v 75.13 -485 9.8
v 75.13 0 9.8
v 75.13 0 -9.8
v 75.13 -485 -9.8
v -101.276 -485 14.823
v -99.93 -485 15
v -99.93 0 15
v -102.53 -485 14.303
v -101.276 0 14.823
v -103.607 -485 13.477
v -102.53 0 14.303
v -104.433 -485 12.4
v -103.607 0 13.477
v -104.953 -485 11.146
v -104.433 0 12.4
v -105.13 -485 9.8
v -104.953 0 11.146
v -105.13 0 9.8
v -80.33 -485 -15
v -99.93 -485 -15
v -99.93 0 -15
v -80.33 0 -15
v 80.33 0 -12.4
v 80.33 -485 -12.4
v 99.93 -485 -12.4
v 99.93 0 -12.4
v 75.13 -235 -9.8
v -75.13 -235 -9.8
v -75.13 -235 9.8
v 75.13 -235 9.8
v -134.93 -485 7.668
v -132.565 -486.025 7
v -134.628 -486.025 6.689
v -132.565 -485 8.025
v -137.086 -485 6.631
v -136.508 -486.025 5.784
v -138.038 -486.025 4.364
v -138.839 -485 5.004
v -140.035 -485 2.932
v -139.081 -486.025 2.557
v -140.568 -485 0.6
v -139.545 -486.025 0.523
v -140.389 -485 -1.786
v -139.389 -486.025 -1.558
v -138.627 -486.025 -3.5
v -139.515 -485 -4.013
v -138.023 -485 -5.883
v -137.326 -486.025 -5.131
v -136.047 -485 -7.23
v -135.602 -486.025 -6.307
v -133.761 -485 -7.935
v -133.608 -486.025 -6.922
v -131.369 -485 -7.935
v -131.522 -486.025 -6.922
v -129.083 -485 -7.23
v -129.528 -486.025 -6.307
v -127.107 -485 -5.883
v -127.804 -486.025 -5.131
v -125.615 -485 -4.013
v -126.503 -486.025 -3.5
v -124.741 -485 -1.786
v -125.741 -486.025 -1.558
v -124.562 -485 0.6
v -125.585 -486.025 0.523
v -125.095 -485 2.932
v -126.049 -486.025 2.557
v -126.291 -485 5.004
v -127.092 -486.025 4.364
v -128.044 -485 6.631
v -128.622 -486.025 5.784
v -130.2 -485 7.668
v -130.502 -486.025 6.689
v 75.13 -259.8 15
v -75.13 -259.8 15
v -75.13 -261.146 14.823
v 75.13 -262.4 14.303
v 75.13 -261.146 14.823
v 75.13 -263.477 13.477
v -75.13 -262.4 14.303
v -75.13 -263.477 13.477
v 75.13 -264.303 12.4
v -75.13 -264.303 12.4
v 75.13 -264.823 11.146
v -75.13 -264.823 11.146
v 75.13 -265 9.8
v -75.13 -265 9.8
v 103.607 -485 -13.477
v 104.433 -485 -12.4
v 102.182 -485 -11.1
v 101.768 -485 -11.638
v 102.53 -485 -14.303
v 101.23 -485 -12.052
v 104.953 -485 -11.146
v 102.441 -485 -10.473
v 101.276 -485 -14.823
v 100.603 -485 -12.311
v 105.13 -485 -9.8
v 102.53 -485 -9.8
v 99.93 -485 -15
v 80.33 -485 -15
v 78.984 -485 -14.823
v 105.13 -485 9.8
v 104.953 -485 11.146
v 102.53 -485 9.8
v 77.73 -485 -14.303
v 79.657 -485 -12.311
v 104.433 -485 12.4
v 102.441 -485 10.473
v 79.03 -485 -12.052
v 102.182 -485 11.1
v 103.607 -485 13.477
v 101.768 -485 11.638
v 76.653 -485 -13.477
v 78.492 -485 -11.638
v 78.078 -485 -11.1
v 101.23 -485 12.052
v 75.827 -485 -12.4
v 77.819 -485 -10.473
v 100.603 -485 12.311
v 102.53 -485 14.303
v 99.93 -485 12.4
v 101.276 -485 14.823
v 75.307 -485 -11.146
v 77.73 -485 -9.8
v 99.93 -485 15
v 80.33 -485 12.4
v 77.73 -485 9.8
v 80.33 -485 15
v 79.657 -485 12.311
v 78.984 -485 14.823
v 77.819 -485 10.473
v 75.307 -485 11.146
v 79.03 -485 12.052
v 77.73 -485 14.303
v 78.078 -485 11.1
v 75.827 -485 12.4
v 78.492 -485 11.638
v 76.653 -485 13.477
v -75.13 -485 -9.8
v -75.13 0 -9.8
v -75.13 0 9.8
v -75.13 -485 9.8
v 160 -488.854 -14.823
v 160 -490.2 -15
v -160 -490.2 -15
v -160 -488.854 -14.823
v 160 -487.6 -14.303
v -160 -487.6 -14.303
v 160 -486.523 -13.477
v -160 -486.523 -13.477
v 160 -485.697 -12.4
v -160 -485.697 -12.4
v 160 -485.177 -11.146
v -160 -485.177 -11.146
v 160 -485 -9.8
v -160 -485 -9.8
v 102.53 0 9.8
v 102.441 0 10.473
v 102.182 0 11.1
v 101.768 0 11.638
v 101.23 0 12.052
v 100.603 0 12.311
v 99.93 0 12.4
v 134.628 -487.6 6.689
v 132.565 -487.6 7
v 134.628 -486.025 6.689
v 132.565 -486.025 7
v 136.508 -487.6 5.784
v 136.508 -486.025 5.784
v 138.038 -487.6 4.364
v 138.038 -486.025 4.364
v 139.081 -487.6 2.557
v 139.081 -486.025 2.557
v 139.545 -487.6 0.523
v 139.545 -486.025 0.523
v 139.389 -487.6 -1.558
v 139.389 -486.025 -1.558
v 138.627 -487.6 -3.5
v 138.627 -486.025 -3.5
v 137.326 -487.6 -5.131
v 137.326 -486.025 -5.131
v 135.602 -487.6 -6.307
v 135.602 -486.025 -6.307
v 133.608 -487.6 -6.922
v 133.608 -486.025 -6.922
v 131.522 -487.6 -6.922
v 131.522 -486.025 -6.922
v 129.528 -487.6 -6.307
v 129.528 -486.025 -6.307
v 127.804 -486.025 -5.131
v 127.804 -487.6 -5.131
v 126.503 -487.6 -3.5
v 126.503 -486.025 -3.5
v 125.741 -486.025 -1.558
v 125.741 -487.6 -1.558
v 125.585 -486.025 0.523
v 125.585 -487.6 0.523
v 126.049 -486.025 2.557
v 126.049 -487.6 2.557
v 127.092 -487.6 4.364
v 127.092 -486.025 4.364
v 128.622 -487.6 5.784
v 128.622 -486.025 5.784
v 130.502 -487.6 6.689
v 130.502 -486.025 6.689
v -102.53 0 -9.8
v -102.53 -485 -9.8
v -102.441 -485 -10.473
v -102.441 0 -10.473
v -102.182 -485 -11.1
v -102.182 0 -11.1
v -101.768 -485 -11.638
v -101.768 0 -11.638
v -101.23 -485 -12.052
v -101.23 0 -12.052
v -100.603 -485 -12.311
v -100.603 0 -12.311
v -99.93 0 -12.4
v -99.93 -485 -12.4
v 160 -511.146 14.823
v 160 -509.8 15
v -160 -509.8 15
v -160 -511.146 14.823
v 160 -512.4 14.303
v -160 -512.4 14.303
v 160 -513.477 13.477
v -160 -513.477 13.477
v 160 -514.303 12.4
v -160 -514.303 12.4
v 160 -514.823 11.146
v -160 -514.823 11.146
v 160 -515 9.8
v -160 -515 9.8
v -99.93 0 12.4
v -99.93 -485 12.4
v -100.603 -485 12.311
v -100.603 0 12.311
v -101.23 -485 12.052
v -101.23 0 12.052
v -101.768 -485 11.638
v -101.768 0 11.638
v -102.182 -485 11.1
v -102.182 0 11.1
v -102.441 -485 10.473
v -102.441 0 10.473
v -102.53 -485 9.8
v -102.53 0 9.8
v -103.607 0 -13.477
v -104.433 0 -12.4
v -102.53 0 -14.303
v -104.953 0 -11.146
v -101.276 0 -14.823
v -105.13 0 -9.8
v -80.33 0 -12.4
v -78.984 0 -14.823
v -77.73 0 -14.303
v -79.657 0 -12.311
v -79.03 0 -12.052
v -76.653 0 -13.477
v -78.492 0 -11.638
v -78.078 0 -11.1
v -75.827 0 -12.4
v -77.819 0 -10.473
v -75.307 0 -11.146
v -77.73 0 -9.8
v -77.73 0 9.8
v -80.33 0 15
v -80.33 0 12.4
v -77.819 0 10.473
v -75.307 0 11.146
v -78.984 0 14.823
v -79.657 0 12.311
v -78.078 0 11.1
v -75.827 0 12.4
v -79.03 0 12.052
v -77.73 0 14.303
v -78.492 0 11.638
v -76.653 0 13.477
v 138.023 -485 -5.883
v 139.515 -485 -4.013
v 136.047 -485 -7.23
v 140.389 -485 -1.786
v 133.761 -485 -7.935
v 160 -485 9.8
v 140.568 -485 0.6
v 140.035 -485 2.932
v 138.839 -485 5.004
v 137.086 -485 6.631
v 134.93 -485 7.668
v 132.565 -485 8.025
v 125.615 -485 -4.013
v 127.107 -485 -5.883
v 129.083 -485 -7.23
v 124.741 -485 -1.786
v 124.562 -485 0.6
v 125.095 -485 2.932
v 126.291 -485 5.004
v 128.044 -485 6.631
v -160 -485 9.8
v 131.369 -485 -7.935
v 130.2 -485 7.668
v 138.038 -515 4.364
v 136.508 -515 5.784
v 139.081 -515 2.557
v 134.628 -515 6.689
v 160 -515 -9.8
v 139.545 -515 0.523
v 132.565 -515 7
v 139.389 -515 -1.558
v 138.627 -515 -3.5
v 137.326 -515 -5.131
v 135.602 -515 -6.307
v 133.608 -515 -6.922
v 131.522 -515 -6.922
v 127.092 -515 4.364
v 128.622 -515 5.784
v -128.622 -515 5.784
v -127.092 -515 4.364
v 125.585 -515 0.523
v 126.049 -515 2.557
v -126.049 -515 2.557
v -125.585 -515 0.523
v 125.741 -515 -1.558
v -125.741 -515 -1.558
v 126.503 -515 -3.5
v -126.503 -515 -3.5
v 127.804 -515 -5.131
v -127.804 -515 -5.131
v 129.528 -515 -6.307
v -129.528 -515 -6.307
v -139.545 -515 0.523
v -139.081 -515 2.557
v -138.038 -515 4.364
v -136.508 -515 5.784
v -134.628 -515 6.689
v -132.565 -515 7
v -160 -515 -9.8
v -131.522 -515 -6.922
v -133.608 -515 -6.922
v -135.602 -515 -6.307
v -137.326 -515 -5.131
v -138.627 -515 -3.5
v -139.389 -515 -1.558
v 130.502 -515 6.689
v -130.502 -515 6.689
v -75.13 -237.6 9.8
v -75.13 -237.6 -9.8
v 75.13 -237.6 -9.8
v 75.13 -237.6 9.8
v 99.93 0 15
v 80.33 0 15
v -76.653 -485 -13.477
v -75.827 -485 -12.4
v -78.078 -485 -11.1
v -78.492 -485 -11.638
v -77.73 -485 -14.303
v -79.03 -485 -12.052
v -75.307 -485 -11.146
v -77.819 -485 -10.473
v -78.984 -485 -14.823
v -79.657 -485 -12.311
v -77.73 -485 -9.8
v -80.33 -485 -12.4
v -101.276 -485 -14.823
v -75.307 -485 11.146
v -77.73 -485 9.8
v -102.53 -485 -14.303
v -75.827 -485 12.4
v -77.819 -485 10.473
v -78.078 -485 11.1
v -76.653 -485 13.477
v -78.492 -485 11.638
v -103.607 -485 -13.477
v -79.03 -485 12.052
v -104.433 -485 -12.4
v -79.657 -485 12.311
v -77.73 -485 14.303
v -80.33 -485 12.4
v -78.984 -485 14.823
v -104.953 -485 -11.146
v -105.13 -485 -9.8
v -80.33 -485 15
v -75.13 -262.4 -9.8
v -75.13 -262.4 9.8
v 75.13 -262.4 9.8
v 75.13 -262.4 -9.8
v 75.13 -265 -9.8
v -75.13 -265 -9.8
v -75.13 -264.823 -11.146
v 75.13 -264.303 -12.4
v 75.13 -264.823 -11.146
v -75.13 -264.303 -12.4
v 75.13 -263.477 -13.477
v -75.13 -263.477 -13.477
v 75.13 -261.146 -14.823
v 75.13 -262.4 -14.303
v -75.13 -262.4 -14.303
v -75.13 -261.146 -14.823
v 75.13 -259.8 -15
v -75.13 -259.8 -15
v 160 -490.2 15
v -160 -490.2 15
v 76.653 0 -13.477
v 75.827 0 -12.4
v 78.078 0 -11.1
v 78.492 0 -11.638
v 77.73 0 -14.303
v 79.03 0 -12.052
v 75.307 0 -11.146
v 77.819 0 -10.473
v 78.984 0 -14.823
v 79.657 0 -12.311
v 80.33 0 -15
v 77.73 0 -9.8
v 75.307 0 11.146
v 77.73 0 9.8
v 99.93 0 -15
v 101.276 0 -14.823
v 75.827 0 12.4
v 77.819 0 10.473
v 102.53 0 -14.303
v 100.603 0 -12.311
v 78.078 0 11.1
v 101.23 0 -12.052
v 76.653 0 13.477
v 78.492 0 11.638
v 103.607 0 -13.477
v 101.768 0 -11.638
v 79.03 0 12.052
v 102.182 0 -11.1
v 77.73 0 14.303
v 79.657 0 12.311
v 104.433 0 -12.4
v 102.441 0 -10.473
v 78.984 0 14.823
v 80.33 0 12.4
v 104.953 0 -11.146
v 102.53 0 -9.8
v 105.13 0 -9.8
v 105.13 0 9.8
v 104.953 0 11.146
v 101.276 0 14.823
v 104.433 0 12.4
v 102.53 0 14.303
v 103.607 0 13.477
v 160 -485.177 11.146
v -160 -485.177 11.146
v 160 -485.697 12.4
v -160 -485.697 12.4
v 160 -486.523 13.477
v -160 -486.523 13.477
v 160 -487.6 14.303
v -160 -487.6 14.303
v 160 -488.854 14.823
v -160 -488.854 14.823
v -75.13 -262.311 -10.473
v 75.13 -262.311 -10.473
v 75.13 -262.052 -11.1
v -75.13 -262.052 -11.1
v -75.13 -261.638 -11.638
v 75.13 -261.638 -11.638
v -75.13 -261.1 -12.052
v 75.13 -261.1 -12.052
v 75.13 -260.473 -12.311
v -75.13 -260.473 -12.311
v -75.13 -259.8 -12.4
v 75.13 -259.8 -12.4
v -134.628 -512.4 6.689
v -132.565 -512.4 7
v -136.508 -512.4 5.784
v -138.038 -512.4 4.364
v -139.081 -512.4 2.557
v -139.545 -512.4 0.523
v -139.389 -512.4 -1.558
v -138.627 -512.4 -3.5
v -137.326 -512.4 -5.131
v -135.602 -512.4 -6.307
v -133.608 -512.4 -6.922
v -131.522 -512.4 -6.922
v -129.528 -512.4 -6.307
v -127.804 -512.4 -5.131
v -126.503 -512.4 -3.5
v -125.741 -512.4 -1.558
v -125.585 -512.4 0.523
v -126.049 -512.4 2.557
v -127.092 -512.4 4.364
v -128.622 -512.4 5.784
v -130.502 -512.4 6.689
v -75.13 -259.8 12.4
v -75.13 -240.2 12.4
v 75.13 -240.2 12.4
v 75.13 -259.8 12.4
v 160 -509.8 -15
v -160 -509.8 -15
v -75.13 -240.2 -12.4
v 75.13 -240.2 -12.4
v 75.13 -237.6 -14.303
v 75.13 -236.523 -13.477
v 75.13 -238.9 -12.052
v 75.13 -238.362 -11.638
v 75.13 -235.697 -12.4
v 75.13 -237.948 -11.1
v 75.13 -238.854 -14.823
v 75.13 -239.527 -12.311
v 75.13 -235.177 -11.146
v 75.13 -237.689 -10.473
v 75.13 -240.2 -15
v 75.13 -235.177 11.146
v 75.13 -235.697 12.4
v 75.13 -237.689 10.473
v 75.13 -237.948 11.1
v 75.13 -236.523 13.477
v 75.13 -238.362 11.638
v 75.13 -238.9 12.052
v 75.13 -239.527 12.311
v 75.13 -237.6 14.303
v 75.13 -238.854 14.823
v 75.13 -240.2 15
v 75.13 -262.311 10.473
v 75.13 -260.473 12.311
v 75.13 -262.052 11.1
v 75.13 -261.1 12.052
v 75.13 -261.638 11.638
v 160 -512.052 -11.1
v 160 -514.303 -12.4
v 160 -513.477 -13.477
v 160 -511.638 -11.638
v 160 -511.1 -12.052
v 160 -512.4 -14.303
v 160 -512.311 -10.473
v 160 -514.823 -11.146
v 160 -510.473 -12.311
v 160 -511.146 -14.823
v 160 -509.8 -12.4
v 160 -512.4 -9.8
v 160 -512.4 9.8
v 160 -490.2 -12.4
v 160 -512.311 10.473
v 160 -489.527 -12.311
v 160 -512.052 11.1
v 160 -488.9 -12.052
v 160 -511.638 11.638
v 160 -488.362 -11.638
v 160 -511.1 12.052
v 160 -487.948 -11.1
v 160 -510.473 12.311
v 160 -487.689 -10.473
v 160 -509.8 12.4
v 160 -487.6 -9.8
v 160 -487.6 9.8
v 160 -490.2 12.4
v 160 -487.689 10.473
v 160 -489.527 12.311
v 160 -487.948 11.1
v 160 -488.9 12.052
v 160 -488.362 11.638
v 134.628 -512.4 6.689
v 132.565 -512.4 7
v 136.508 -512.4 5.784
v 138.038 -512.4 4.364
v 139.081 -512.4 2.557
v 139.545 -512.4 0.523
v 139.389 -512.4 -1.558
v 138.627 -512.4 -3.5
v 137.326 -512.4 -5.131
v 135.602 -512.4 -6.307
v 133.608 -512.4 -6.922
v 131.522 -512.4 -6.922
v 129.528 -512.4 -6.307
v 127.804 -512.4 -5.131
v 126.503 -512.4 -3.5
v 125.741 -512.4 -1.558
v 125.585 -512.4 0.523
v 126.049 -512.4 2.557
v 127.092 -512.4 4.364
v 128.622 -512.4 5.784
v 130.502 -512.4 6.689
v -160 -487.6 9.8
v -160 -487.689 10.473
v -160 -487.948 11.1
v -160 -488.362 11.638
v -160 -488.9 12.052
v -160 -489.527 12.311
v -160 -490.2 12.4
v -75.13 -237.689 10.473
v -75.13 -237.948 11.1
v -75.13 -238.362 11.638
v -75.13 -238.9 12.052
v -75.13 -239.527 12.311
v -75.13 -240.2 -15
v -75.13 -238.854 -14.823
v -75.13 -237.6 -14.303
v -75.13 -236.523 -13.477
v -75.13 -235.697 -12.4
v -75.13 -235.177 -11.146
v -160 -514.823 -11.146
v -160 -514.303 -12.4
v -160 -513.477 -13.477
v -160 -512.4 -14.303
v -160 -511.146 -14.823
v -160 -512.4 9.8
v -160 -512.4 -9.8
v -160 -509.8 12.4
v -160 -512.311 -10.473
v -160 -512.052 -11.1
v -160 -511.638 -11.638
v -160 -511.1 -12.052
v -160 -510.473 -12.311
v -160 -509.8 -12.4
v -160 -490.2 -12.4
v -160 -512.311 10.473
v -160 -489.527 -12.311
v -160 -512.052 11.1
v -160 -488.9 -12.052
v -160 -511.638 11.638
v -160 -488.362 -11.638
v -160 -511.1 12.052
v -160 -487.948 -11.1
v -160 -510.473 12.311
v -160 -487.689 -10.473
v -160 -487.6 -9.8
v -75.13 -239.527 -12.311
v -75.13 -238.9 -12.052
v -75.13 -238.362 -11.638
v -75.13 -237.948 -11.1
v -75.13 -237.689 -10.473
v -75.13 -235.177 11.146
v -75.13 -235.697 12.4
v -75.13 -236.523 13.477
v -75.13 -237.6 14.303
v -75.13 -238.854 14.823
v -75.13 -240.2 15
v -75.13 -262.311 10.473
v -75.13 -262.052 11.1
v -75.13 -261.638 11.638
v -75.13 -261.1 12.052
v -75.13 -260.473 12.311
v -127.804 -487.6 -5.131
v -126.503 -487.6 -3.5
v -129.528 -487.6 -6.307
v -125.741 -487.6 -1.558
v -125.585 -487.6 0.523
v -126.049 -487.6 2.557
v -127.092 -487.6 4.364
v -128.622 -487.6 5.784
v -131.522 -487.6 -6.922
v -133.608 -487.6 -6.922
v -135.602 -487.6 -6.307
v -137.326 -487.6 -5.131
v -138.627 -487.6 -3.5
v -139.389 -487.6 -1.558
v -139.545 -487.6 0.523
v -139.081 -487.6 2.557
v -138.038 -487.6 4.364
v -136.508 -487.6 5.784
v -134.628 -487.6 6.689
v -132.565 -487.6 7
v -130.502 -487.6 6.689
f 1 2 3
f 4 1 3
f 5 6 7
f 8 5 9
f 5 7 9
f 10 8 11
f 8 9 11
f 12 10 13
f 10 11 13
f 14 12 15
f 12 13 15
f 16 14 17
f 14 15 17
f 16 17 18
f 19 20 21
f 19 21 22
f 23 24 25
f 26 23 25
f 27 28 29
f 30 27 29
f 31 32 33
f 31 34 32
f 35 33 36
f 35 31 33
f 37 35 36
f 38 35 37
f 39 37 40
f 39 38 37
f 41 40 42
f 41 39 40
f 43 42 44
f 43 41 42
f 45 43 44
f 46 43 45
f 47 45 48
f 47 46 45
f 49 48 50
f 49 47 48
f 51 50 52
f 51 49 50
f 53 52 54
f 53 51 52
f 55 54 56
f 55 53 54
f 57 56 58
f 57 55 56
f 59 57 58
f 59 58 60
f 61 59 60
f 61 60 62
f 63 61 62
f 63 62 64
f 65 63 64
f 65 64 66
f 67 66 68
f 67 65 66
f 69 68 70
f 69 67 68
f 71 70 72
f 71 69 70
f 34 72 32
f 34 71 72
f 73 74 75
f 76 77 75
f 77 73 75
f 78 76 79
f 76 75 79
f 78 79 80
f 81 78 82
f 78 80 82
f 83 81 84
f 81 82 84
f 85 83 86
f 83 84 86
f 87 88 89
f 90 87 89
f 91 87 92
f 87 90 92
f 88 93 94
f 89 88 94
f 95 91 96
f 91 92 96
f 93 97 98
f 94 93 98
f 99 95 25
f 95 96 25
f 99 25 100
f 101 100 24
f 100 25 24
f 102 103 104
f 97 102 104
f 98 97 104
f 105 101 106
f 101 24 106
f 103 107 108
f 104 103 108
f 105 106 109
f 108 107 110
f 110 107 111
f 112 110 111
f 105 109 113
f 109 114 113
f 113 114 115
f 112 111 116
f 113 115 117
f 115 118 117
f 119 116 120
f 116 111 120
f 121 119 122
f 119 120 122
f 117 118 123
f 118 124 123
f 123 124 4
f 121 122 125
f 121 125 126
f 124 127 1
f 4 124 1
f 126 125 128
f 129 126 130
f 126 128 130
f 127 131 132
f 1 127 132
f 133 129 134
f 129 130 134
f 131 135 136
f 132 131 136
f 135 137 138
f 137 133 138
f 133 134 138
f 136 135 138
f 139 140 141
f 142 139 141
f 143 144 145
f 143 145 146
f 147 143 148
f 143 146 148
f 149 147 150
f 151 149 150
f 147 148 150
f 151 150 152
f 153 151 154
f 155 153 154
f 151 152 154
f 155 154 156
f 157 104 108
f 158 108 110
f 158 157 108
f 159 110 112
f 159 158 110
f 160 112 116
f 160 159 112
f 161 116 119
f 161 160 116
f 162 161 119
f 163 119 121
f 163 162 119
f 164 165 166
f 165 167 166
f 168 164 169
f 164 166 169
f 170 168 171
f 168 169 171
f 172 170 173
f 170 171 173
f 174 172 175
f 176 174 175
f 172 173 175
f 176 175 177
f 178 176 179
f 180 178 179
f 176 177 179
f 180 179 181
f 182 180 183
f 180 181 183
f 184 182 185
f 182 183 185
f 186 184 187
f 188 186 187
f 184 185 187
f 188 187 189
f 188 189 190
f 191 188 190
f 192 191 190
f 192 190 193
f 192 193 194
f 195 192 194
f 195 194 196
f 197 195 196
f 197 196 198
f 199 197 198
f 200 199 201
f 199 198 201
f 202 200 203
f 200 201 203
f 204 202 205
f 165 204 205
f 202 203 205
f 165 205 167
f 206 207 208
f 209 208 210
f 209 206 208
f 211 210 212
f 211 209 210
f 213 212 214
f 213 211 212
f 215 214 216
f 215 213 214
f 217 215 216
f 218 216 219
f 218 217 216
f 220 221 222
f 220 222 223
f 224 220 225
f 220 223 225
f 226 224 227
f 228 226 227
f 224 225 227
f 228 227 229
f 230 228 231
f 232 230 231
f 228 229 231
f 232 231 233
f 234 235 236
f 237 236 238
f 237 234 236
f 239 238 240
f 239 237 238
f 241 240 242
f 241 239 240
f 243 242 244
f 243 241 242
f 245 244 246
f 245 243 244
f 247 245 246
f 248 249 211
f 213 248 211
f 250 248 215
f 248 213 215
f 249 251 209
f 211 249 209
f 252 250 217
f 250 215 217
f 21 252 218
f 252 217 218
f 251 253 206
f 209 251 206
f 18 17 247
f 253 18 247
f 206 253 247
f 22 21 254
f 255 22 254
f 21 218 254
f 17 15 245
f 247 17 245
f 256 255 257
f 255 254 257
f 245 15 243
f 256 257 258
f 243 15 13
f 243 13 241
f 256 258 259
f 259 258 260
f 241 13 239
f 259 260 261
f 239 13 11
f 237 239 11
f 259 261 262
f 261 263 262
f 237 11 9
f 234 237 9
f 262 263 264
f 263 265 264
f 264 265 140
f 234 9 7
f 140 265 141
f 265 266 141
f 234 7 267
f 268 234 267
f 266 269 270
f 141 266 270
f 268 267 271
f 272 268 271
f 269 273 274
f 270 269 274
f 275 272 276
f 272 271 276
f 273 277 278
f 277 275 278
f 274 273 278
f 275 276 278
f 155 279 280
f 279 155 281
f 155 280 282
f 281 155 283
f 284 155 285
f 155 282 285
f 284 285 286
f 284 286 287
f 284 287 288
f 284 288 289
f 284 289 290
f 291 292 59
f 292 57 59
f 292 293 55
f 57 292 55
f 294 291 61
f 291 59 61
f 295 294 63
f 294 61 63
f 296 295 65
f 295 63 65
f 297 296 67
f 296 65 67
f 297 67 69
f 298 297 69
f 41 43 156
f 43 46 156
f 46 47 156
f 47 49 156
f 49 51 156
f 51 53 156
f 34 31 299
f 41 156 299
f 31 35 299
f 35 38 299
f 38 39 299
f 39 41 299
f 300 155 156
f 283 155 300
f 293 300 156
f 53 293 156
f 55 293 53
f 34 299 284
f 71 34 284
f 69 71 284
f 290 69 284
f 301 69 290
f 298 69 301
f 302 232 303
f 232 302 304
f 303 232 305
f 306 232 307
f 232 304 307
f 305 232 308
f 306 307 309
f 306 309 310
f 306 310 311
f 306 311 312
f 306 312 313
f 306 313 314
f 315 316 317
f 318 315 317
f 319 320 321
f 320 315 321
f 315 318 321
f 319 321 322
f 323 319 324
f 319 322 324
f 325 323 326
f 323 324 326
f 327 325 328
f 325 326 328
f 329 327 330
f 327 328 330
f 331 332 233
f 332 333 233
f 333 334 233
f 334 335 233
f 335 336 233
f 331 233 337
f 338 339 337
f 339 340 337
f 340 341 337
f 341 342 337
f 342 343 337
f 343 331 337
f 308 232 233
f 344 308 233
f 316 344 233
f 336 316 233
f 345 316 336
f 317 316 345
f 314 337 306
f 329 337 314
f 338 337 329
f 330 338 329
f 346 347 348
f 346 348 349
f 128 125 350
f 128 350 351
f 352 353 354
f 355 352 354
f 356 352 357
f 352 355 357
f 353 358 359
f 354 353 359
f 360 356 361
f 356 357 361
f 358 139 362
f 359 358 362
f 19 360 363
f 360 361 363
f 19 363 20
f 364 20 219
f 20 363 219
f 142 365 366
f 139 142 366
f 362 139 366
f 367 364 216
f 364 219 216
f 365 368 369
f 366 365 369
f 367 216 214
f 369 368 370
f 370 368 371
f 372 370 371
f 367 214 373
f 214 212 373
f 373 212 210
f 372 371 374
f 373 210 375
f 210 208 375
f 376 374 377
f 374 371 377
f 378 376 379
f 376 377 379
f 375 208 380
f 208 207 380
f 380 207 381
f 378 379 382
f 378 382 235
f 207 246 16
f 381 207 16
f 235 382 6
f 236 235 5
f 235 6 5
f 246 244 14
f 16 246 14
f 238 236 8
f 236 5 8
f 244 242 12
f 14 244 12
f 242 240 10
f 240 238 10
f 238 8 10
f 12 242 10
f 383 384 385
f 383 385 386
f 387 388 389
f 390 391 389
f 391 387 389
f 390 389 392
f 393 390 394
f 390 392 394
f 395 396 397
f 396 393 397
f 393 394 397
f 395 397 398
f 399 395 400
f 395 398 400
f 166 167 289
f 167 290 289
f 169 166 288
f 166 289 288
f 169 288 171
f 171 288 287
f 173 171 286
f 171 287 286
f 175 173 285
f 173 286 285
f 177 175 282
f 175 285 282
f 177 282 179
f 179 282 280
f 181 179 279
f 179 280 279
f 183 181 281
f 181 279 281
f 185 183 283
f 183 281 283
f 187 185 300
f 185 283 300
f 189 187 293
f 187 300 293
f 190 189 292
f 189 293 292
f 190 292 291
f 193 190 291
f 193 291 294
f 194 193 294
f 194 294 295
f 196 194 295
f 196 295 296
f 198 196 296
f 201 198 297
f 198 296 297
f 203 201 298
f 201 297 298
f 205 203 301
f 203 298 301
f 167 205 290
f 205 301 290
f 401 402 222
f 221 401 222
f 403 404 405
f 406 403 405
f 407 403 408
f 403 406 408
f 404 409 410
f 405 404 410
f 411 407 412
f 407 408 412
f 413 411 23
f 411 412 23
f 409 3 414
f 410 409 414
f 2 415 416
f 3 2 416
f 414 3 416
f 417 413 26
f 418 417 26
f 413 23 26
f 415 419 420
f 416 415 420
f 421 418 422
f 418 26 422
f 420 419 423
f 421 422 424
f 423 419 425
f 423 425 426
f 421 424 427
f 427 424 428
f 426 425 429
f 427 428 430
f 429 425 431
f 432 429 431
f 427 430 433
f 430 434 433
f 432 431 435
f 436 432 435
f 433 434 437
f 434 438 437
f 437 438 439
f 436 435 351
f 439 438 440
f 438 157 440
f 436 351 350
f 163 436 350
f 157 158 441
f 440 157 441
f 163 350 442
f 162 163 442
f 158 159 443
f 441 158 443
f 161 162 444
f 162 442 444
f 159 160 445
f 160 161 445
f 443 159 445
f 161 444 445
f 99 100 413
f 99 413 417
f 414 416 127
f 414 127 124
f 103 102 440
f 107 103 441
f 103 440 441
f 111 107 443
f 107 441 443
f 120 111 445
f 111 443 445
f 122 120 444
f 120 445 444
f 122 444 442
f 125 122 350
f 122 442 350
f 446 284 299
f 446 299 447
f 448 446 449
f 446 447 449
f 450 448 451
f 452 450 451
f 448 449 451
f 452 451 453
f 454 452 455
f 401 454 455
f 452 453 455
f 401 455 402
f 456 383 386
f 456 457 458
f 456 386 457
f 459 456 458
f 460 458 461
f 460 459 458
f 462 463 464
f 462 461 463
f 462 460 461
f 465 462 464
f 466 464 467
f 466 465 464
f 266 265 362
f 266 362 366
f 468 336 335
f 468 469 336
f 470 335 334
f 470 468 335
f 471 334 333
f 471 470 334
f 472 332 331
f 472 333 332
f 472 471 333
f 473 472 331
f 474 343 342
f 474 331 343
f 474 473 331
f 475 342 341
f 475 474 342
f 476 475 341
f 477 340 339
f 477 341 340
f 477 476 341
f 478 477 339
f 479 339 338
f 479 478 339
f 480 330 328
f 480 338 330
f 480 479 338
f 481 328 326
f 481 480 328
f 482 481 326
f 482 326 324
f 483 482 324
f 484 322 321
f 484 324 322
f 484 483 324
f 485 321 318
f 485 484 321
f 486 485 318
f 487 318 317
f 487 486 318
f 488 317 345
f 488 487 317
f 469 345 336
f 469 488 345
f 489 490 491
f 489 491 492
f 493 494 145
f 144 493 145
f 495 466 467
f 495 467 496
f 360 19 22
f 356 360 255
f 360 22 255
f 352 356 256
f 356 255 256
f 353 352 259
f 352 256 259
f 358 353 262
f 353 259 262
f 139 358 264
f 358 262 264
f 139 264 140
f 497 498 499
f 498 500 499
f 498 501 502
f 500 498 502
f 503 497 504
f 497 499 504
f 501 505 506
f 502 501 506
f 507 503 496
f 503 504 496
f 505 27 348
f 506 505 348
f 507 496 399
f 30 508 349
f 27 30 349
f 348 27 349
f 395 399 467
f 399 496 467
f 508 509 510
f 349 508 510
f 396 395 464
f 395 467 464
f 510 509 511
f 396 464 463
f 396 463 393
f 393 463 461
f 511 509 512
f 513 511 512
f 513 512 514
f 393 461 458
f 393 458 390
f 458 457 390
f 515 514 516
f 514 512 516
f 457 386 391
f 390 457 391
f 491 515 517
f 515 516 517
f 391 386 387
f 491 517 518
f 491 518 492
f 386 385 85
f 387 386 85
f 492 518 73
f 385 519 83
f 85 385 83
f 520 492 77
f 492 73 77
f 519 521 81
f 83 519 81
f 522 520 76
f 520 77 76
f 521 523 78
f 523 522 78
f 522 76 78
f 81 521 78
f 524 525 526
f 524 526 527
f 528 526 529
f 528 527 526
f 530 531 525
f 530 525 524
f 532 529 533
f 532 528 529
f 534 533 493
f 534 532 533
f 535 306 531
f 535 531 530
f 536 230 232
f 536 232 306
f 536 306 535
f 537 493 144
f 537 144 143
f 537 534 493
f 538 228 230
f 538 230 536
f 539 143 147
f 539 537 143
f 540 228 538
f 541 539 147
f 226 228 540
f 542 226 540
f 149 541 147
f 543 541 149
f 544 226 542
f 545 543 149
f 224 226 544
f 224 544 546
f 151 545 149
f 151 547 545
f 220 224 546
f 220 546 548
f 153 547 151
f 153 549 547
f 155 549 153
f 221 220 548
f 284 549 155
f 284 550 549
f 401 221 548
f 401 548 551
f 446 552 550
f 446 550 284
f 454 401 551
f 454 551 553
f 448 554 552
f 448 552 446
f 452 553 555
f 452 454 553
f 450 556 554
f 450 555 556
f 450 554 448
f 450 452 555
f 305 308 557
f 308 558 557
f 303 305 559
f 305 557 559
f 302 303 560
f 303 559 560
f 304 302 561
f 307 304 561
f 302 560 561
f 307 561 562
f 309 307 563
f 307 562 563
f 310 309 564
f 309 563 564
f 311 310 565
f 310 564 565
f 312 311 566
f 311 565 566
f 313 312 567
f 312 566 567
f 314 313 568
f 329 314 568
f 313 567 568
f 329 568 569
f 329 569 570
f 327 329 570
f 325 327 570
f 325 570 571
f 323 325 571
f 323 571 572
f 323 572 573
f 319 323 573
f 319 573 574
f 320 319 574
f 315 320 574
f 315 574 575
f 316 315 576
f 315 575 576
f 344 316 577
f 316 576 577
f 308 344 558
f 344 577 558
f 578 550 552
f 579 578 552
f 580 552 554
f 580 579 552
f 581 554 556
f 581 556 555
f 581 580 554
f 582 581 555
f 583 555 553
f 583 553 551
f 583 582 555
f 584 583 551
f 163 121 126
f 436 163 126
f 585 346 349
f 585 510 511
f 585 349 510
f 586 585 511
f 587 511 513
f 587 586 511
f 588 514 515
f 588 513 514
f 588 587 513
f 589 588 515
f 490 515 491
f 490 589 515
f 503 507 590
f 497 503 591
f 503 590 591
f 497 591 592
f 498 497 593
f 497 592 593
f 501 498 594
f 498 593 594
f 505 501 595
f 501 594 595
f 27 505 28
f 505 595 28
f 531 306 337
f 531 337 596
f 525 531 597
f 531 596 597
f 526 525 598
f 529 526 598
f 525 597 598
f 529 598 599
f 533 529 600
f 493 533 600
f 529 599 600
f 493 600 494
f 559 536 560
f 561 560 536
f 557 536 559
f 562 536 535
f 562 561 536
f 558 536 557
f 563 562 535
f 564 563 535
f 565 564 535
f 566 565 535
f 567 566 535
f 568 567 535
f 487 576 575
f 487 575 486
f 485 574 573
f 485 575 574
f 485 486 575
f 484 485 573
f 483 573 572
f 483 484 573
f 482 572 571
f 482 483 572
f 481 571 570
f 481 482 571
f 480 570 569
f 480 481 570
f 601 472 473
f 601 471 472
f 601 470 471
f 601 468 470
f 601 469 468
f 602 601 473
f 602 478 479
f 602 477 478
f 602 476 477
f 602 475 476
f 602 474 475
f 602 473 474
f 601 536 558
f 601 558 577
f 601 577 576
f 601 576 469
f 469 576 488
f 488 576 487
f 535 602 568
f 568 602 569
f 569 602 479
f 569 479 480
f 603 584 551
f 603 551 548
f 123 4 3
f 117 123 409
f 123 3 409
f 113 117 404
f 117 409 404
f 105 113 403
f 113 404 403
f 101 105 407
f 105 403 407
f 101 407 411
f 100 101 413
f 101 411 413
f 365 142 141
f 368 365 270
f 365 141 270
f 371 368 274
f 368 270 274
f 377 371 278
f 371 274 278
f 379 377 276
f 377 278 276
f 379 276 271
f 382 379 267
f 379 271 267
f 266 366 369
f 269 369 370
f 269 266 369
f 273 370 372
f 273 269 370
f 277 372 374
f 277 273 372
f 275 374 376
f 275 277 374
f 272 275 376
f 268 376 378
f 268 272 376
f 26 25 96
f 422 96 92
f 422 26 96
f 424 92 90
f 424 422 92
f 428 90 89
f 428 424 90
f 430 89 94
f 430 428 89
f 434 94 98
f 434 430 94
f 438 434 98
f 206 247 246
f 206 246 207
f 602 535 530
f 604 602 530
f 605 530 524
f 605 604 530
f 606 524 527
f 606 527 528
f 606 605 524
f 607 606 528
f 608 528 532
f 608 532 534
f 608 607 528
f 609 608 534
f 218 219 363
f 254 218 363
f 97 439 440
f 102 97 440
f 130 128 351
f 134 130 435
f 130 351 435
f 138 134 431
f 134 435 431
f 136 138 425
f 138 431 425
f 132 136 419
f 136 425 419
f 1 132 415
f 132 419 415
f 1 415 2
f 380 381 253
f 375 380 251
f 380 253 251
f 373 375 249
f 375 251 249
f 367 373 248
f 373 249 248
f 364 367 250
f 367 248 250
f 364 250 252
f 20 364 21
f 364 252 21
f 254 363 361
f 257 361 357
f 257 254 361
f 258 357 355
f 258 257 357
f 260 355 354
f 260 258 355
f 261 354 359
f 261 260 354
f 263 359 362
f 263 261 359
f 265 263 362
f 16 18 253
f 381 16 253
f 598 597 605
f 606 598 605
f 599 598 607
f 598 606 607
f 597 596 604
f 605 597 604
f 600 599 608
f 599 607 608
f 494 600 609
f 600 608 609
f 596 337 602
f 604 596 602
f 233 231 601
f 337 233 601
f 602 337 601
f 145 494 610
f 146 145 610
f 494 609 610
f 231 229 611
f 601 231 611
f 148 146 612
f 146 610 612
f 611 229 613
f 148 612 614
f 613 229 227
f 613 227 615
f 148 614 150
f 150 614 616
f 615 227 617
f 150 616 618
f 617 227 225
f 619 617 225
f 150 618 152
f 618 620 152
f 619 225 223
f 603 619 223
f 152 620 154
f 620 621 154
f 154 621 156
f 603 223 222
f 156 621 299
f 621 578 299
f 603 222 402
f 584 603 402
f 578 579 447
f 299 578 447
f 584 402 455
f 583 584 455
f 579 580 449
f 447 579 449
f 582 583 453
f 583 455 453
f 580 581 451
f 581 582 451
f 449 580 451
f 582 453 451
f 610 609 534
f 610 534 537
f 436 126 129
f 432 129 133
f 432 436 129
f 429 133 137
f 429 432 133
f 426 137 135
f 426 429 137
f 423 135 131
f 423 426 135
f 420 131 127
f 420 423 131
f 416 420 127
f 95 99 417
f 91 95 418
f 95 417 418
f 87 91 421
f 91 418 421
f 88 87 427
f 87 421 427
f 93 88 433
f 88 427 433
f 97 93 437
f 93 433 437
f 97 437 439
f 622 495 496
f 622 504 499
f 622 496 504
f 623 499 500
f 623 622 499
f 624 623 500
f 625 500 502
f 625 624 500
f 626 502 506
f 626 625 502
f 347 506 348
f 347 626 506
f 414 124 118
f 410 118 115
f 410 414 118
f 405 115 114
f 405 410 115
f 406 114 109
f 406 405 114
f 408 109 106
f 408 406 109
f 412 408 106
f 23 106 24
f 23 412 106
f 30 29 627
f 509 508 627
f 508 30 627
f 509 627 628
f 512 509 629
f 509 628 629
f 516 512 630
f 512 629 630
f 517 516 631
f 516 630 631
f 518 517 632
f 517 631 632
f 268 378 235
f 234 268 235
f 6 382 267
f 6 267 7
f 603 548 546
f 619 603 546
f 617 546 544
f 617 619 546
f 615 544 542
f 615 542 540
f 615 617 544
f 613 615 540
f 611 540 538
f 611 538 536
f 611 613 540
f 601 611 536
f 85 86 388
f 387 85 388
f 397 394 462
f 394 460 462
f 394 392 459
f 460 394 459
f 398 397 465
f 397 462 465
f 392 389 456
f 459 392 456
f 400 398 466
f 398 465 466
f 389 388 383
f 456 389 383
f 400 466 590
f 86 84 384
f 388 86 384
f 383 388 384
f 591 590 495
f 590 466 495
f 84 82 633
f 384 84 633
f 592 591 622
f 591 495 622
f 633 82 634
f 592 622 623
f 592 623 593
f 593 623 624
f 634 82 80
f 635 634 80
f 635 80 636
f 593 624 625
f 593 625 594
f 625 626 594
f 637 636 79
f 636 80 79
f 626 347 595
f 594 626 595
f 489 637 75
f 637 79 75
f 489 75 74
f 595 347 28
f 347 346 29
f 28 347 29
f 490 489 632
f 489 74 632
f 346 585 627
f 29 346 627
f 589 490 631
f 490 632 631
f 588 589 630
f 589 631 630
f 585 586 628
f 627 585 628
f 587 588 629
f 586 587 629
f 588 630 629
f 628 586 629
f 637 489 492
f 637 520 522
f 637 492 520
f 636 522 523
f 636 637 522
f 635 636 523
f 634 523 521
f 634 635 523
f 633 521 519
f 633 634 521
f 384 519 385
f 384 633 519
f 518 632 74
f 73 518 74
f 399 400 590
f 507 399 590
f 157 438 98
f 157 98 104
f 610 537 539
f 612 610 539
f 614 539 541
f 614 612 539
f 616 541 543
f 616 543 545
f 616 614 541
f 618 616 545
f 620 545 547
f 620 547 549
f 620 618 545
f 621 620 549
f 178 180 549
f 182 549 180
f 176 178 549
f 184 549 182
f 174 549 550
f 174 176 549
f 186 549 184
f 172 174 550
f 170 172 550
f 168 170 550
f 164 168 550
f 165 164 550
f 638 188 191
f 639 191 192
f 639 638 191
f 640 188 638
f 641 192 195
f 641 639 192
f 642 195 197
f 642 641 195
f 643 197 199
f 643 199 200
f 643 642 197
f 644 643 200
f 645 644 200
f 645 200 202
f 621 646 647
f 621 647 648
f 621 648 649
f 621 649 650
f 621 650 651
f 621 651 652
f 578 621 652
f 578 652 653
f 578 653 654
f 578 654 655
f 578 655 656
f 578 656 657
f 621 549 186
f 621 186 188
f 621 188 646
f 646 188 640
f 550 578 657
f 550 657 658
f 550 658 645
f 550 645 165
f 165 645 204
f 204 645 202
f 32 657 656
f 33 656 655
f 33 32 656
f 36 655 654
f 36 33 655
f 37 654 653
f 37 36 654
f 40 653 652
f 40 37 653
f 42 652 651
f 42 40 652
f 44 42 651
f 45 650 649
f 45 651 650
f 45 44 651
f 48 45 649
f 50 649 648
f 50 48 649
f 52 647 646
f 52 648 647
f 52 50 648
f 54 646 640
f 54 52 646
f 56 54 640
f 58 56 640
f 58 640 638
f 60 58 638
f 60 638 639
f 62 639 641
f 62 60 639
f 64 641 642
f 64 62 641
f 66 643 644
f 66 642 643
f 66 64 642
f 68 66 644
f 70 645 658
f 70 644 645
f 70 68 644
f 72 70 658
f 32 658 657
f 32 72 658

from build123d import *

# Parameters (mm, degrees)
SQUARE_TUBE_30_X_30_X_2_6_1_DEPTH   = 501
SQUARE_TUBE_30_X_30_X_2_6_1_2_DEPTH = 501
SQUARE_TUBE_30_X_30_X_2_6_1_3_DEPTH = 320
SQUARE_TUBE_30_X_30_X_2_6_1_4_DEPTH = 182.26


with BuildPart() as part:
    # Sketch17 → Square tube 30 X 30 X 2.6(1) (new body)
    with BuildSketch(Plane(origin=(-90.13, 0, 0), x_dir=(1, 0, 0), z_dir=(0, -1, 0))):
        with BuildLine():
            Line((-9.8, -15), (9.8, -15))
            ThreePointArc((9.8, -15), (13.476955262, -13.476955262), (15, -9.8))
            Line((15, -9.8), (15, 9.8))
            ThreePointArc((15, 9.8), (13.476955262, 13.476955262), (9.8, 15))
            Line((9.8, 15), (-9.8, 15))
            ThreePointArc((-9.8, 15), (-13.476955262, 13.476955262), (-15, 9.8))
            Line((-15, 9.8), (-15, -9.8))
            ThreePointArc((-15, -9.8), (-13.476955262, -13.476955262), (-9.8, -15))
        make_face()
        with BuildLine():
            Line((-9.8, -12.4), (9.8, -12.4))
            ThreePointArc((9.8, -12.4), (11.638477631, -11.638477631), (12.4, -9.8))
            Line((12.4, -9.8), (12.4, 9.8))
            ThreePointArc((12.4, 9.8), (11.638477631, 11.638477631), (9.8, 12.4))
            Line((9.8, 12.4), (-9.8, 12.4))
            ThreePointArc((-9.8, 12.4), (-11.638477631, 11.638477631), (-12.4, 9.8))
            Line((-12.4, 9.8), (-12.4, -9.8))
            ThreePointArc((-12.4, -9.8), (-11.638477631, -11.638477631), (-9.8, -12.4))
        make_face(mode=Mode.SUBTRACT)
    extrude(amount=SQUARE_TUBE_30_X_30_X_2_6_1_DEPTH)

    # Square tube 30 X 30 X 2.6(1) end butt 1
    split(bisect_by=Plane(origin=(-90.13, -485, 0), x_dir=(-1, 0, 0), z_dir=(0, 1, 0)), keep=Keep.TOP)


with BuildPart() as body_2:
    # Sketch17 on segment 2 (carried to segment 2) → Square tube 30 X 30 X 2.6_1 2 (new body)
    with BuildSketch(Plane(origin=(90.13, 0, 0), x_dir=(1, 0, 0), z_dir=(0, -1, 0))):
        with BuildLine():
            Line((-9.8, -15), (9.8, -15))
            ThreePointArc((9.8, -15), (13.476955262, -13.476955262), (15, -9.8))
            Line((15, -9.8), (15, 9.8))
            ThreePointArc((15, 9.8), (13.476955262, 13.476955262), (9.8, 15))
            Line((9.8, 15), (-9.8, 15))
            ThreePointArc((-9.8, 15), (-13.476955262, 13.476955262), (-15, 9.8))
            Line((-15, 9.8), (-15, -9.8))
            ThreePointArc((-15, -9.8), (-13.476955262, -13.476955262), (-9.8, -15))
        make_face()
        with BuildLine():
            Line((-9.8, -12.4), (9.8, -12.4))
            ThreePointArc((9.8, -12.4), (11.638477631, -11.638477631), (12.4, -9.8))
            Line((12.4, -9.8), (12.4, 9.8))
            ThreePointArc((12.4, 9.8), (11.638477631, 11.638477631), (9.8, 12.4))
            Line((9.8, 12.4), (-9.8, 12.4))
            ThreePointArc((-9.8, 12.4), (-11.638477631, 11.638477631), (-12.4, 9.8))
            Line((-12.4, 9.8), (-12.4, -9.8))
            ThreePointArc((-12.4, -9.8), (-11.638477631, -11.638477631), (-9.8, -12.4))
        make_face(mode=Mode.SUBTRACT)
    extrude(amount=SQUARE_TUBE_30_X_30_X_2_6_1_2_DEPTH)

    # Square tube 30 X 30 X 2.6_1 2 end butt 1
    split(bisect_by=Plane(origin=(90.13, -485, 0), x_dir=(-1, 0, 0), z_dir=(0, 1, 0)), keep=Keep.TOP)


with BuildPart() as body_3:
    # Sketch17 on segment 3 (carried to segment 3) → Square tube 30 X 30 X 2.6_1 3 (new body)
    with BuildSketch(Plane(origin=(-160, -500, 0), x_dir=(0, 1, 0), z_dir=(1, 0, 0))):
        with BuildLine():
            Line((-9.8, -15), (9.8, -15))
            ThreePointArc((9.8, -15), (13.476955262, -13.476955262), (15, -9.8))
            Line((15, -9.8), (15, 9.8))
            ThreePointArc((15, 9.8), (13.476955262, 13.476955262), (9.8, 15))
            Line((9.8, 15), (-9.8, 15))
            ThreePointArc((-9.8, 15), (-13.476955262, 13.476955262), (-15, 9.8))
            Line((-15, 9.8), (-15, -9.8))
            ThreePointArc((-15, -9.8), (-13.476955262, -13.476955262), (-9.8, -15))
        make_face()
        with BuildLine():
            Line((-9.8, -12.4), (9.8, -12.4))
            ThreePointArc((9.8, -12.4), (11.638477631, -11.638477631), (12.4, -9.8))
            Line((12.4, -9.8), (12.4, 9.8))
            ThreePointArc((12.4, 9.8), (11.638477631, 11.638477631), (9.8, 12.4))
            Line((9.8, 12.4), (-9.8, 12.4))
            ThreePointArc((-9.8, 12.4), (-11.638477631, 11.638477631), (-12.4, 9.8))
            Line((-12.4, 9.8), (-12.4, -9.8))
            ThreePointArc((-12.4, -9.8), (-11.638477631, -11.638477631), (-9.8, -12.4))
        make_face(mode=Mode.SUBTRACT)
    extrude(amount=SQUARE_TUBE_30_X_30_X_2_6_1_3_DEPTH)

    # Sketch19 → M16 Tapped Hole1 (revolve, cut)
    with BuildSketch(Plane(origin=(-132.565, -485, 0), x_dir=(0, 0, 1), z_dir=(1, 0, 0))):
        Polygon((0, 0), (0, 42.206024333), (7, 38), (7, 1.025), (8.025, 0), align=None)
    m16_tapped_hole1 = revolve(axis=Axis((-132.565, -478.65, 0), (0, -1, 0)), mode=Mode.SUBTRACT)

    # Mirror1: M16 Tapped Hole1 across plane
    add(m16_tapped_hole1.mirror(Plane(origin=(0, 0, 0), x_dir=(0, 0, 1), z_dir=(1, 0, 0))), mode=Mode.SUBTRACT)


with BuildPart() as body_4:
    # Sketch17 on segment 4 (carried to segment 4) → Square tube 30 X 30 X 2.6_1 4 (new body)
    with BuildSketch(Plane(origin=(-91.13, -250, 0), x_dir=(0, 1, 0), z_dir=(1, 0, 0))):
        with BuildLine():
            Line((-9.8, -15), (9.8, -15))
            ThreePointArc((9.8, -15), (13.476955262, -13.476955262), (15, -9.8))
            Line((15, -9.8), (15, 9.8))
            ThreePointArc((15, 9.8), (13.476955262, 13.476955262), (9.8, 15))
            Line((9.8, 15), (-9.8, 15))
            ThreePointArc((-9.8, 15), (-13.476955262, 13.476955262), (-15, 9.8))
            Line((-15, 9.8), (-15, -9.8))
            ThreePointArc((-15, -9.8), (-13.476955262, -13.476955262), (-9.8, -15))
        make_face()
        with BuildLine():
            Line((-9.8, -12.4), (9.8, -12.4))
            ThreePointArc((9.8, -12.4), (11.638477631, -11.638477631), (12.4, -9.8))
            Line((12.4, -9.8), (12.4, 9.8))
            ThreePointArc((12.4, 9.8), (11.638477631, 11.638477631), (9.8, 12.4))
            Line((9.8, 12.4), (-9.8, 12.4))
            ThreePointArc((-9.8, 12.4), (-11.638477631, 11.638477631), (-12.4, 9.8))
            Line((-12.4, 9.8), (-12.4, -9.8))
            ThreePointArc((-12.4, -9.8), (-11.638477631, -11.638477631), (-9.8, -12.4))
        make_face(mode=Mode.SUBTRACT)
    extrude(amount=SQUARE_TUBE_30_X_30_X_2_6_1_4_DEPTH)

    # Square tube 30 X 30 X 2.6_1 4 end butt 1
    split(bisect_by=Plane(origin=(-75.13, -250, 0), x_dir=(0, 1, 0), z_dir=(1, 0, 0)), keep=Keep.TOP)

    # Square tube 30 X 30 X 2.6_1 4 end butt 2
    split(bisect_by=Plane(origin=(75.13, -250, 0), x_dir=(0, -1, 0), z_dir=(-1, 0, 0)), keep=Keep.TOP)


solid = Compound([part.part, body_2.part, body_3.part, body_4.part])
